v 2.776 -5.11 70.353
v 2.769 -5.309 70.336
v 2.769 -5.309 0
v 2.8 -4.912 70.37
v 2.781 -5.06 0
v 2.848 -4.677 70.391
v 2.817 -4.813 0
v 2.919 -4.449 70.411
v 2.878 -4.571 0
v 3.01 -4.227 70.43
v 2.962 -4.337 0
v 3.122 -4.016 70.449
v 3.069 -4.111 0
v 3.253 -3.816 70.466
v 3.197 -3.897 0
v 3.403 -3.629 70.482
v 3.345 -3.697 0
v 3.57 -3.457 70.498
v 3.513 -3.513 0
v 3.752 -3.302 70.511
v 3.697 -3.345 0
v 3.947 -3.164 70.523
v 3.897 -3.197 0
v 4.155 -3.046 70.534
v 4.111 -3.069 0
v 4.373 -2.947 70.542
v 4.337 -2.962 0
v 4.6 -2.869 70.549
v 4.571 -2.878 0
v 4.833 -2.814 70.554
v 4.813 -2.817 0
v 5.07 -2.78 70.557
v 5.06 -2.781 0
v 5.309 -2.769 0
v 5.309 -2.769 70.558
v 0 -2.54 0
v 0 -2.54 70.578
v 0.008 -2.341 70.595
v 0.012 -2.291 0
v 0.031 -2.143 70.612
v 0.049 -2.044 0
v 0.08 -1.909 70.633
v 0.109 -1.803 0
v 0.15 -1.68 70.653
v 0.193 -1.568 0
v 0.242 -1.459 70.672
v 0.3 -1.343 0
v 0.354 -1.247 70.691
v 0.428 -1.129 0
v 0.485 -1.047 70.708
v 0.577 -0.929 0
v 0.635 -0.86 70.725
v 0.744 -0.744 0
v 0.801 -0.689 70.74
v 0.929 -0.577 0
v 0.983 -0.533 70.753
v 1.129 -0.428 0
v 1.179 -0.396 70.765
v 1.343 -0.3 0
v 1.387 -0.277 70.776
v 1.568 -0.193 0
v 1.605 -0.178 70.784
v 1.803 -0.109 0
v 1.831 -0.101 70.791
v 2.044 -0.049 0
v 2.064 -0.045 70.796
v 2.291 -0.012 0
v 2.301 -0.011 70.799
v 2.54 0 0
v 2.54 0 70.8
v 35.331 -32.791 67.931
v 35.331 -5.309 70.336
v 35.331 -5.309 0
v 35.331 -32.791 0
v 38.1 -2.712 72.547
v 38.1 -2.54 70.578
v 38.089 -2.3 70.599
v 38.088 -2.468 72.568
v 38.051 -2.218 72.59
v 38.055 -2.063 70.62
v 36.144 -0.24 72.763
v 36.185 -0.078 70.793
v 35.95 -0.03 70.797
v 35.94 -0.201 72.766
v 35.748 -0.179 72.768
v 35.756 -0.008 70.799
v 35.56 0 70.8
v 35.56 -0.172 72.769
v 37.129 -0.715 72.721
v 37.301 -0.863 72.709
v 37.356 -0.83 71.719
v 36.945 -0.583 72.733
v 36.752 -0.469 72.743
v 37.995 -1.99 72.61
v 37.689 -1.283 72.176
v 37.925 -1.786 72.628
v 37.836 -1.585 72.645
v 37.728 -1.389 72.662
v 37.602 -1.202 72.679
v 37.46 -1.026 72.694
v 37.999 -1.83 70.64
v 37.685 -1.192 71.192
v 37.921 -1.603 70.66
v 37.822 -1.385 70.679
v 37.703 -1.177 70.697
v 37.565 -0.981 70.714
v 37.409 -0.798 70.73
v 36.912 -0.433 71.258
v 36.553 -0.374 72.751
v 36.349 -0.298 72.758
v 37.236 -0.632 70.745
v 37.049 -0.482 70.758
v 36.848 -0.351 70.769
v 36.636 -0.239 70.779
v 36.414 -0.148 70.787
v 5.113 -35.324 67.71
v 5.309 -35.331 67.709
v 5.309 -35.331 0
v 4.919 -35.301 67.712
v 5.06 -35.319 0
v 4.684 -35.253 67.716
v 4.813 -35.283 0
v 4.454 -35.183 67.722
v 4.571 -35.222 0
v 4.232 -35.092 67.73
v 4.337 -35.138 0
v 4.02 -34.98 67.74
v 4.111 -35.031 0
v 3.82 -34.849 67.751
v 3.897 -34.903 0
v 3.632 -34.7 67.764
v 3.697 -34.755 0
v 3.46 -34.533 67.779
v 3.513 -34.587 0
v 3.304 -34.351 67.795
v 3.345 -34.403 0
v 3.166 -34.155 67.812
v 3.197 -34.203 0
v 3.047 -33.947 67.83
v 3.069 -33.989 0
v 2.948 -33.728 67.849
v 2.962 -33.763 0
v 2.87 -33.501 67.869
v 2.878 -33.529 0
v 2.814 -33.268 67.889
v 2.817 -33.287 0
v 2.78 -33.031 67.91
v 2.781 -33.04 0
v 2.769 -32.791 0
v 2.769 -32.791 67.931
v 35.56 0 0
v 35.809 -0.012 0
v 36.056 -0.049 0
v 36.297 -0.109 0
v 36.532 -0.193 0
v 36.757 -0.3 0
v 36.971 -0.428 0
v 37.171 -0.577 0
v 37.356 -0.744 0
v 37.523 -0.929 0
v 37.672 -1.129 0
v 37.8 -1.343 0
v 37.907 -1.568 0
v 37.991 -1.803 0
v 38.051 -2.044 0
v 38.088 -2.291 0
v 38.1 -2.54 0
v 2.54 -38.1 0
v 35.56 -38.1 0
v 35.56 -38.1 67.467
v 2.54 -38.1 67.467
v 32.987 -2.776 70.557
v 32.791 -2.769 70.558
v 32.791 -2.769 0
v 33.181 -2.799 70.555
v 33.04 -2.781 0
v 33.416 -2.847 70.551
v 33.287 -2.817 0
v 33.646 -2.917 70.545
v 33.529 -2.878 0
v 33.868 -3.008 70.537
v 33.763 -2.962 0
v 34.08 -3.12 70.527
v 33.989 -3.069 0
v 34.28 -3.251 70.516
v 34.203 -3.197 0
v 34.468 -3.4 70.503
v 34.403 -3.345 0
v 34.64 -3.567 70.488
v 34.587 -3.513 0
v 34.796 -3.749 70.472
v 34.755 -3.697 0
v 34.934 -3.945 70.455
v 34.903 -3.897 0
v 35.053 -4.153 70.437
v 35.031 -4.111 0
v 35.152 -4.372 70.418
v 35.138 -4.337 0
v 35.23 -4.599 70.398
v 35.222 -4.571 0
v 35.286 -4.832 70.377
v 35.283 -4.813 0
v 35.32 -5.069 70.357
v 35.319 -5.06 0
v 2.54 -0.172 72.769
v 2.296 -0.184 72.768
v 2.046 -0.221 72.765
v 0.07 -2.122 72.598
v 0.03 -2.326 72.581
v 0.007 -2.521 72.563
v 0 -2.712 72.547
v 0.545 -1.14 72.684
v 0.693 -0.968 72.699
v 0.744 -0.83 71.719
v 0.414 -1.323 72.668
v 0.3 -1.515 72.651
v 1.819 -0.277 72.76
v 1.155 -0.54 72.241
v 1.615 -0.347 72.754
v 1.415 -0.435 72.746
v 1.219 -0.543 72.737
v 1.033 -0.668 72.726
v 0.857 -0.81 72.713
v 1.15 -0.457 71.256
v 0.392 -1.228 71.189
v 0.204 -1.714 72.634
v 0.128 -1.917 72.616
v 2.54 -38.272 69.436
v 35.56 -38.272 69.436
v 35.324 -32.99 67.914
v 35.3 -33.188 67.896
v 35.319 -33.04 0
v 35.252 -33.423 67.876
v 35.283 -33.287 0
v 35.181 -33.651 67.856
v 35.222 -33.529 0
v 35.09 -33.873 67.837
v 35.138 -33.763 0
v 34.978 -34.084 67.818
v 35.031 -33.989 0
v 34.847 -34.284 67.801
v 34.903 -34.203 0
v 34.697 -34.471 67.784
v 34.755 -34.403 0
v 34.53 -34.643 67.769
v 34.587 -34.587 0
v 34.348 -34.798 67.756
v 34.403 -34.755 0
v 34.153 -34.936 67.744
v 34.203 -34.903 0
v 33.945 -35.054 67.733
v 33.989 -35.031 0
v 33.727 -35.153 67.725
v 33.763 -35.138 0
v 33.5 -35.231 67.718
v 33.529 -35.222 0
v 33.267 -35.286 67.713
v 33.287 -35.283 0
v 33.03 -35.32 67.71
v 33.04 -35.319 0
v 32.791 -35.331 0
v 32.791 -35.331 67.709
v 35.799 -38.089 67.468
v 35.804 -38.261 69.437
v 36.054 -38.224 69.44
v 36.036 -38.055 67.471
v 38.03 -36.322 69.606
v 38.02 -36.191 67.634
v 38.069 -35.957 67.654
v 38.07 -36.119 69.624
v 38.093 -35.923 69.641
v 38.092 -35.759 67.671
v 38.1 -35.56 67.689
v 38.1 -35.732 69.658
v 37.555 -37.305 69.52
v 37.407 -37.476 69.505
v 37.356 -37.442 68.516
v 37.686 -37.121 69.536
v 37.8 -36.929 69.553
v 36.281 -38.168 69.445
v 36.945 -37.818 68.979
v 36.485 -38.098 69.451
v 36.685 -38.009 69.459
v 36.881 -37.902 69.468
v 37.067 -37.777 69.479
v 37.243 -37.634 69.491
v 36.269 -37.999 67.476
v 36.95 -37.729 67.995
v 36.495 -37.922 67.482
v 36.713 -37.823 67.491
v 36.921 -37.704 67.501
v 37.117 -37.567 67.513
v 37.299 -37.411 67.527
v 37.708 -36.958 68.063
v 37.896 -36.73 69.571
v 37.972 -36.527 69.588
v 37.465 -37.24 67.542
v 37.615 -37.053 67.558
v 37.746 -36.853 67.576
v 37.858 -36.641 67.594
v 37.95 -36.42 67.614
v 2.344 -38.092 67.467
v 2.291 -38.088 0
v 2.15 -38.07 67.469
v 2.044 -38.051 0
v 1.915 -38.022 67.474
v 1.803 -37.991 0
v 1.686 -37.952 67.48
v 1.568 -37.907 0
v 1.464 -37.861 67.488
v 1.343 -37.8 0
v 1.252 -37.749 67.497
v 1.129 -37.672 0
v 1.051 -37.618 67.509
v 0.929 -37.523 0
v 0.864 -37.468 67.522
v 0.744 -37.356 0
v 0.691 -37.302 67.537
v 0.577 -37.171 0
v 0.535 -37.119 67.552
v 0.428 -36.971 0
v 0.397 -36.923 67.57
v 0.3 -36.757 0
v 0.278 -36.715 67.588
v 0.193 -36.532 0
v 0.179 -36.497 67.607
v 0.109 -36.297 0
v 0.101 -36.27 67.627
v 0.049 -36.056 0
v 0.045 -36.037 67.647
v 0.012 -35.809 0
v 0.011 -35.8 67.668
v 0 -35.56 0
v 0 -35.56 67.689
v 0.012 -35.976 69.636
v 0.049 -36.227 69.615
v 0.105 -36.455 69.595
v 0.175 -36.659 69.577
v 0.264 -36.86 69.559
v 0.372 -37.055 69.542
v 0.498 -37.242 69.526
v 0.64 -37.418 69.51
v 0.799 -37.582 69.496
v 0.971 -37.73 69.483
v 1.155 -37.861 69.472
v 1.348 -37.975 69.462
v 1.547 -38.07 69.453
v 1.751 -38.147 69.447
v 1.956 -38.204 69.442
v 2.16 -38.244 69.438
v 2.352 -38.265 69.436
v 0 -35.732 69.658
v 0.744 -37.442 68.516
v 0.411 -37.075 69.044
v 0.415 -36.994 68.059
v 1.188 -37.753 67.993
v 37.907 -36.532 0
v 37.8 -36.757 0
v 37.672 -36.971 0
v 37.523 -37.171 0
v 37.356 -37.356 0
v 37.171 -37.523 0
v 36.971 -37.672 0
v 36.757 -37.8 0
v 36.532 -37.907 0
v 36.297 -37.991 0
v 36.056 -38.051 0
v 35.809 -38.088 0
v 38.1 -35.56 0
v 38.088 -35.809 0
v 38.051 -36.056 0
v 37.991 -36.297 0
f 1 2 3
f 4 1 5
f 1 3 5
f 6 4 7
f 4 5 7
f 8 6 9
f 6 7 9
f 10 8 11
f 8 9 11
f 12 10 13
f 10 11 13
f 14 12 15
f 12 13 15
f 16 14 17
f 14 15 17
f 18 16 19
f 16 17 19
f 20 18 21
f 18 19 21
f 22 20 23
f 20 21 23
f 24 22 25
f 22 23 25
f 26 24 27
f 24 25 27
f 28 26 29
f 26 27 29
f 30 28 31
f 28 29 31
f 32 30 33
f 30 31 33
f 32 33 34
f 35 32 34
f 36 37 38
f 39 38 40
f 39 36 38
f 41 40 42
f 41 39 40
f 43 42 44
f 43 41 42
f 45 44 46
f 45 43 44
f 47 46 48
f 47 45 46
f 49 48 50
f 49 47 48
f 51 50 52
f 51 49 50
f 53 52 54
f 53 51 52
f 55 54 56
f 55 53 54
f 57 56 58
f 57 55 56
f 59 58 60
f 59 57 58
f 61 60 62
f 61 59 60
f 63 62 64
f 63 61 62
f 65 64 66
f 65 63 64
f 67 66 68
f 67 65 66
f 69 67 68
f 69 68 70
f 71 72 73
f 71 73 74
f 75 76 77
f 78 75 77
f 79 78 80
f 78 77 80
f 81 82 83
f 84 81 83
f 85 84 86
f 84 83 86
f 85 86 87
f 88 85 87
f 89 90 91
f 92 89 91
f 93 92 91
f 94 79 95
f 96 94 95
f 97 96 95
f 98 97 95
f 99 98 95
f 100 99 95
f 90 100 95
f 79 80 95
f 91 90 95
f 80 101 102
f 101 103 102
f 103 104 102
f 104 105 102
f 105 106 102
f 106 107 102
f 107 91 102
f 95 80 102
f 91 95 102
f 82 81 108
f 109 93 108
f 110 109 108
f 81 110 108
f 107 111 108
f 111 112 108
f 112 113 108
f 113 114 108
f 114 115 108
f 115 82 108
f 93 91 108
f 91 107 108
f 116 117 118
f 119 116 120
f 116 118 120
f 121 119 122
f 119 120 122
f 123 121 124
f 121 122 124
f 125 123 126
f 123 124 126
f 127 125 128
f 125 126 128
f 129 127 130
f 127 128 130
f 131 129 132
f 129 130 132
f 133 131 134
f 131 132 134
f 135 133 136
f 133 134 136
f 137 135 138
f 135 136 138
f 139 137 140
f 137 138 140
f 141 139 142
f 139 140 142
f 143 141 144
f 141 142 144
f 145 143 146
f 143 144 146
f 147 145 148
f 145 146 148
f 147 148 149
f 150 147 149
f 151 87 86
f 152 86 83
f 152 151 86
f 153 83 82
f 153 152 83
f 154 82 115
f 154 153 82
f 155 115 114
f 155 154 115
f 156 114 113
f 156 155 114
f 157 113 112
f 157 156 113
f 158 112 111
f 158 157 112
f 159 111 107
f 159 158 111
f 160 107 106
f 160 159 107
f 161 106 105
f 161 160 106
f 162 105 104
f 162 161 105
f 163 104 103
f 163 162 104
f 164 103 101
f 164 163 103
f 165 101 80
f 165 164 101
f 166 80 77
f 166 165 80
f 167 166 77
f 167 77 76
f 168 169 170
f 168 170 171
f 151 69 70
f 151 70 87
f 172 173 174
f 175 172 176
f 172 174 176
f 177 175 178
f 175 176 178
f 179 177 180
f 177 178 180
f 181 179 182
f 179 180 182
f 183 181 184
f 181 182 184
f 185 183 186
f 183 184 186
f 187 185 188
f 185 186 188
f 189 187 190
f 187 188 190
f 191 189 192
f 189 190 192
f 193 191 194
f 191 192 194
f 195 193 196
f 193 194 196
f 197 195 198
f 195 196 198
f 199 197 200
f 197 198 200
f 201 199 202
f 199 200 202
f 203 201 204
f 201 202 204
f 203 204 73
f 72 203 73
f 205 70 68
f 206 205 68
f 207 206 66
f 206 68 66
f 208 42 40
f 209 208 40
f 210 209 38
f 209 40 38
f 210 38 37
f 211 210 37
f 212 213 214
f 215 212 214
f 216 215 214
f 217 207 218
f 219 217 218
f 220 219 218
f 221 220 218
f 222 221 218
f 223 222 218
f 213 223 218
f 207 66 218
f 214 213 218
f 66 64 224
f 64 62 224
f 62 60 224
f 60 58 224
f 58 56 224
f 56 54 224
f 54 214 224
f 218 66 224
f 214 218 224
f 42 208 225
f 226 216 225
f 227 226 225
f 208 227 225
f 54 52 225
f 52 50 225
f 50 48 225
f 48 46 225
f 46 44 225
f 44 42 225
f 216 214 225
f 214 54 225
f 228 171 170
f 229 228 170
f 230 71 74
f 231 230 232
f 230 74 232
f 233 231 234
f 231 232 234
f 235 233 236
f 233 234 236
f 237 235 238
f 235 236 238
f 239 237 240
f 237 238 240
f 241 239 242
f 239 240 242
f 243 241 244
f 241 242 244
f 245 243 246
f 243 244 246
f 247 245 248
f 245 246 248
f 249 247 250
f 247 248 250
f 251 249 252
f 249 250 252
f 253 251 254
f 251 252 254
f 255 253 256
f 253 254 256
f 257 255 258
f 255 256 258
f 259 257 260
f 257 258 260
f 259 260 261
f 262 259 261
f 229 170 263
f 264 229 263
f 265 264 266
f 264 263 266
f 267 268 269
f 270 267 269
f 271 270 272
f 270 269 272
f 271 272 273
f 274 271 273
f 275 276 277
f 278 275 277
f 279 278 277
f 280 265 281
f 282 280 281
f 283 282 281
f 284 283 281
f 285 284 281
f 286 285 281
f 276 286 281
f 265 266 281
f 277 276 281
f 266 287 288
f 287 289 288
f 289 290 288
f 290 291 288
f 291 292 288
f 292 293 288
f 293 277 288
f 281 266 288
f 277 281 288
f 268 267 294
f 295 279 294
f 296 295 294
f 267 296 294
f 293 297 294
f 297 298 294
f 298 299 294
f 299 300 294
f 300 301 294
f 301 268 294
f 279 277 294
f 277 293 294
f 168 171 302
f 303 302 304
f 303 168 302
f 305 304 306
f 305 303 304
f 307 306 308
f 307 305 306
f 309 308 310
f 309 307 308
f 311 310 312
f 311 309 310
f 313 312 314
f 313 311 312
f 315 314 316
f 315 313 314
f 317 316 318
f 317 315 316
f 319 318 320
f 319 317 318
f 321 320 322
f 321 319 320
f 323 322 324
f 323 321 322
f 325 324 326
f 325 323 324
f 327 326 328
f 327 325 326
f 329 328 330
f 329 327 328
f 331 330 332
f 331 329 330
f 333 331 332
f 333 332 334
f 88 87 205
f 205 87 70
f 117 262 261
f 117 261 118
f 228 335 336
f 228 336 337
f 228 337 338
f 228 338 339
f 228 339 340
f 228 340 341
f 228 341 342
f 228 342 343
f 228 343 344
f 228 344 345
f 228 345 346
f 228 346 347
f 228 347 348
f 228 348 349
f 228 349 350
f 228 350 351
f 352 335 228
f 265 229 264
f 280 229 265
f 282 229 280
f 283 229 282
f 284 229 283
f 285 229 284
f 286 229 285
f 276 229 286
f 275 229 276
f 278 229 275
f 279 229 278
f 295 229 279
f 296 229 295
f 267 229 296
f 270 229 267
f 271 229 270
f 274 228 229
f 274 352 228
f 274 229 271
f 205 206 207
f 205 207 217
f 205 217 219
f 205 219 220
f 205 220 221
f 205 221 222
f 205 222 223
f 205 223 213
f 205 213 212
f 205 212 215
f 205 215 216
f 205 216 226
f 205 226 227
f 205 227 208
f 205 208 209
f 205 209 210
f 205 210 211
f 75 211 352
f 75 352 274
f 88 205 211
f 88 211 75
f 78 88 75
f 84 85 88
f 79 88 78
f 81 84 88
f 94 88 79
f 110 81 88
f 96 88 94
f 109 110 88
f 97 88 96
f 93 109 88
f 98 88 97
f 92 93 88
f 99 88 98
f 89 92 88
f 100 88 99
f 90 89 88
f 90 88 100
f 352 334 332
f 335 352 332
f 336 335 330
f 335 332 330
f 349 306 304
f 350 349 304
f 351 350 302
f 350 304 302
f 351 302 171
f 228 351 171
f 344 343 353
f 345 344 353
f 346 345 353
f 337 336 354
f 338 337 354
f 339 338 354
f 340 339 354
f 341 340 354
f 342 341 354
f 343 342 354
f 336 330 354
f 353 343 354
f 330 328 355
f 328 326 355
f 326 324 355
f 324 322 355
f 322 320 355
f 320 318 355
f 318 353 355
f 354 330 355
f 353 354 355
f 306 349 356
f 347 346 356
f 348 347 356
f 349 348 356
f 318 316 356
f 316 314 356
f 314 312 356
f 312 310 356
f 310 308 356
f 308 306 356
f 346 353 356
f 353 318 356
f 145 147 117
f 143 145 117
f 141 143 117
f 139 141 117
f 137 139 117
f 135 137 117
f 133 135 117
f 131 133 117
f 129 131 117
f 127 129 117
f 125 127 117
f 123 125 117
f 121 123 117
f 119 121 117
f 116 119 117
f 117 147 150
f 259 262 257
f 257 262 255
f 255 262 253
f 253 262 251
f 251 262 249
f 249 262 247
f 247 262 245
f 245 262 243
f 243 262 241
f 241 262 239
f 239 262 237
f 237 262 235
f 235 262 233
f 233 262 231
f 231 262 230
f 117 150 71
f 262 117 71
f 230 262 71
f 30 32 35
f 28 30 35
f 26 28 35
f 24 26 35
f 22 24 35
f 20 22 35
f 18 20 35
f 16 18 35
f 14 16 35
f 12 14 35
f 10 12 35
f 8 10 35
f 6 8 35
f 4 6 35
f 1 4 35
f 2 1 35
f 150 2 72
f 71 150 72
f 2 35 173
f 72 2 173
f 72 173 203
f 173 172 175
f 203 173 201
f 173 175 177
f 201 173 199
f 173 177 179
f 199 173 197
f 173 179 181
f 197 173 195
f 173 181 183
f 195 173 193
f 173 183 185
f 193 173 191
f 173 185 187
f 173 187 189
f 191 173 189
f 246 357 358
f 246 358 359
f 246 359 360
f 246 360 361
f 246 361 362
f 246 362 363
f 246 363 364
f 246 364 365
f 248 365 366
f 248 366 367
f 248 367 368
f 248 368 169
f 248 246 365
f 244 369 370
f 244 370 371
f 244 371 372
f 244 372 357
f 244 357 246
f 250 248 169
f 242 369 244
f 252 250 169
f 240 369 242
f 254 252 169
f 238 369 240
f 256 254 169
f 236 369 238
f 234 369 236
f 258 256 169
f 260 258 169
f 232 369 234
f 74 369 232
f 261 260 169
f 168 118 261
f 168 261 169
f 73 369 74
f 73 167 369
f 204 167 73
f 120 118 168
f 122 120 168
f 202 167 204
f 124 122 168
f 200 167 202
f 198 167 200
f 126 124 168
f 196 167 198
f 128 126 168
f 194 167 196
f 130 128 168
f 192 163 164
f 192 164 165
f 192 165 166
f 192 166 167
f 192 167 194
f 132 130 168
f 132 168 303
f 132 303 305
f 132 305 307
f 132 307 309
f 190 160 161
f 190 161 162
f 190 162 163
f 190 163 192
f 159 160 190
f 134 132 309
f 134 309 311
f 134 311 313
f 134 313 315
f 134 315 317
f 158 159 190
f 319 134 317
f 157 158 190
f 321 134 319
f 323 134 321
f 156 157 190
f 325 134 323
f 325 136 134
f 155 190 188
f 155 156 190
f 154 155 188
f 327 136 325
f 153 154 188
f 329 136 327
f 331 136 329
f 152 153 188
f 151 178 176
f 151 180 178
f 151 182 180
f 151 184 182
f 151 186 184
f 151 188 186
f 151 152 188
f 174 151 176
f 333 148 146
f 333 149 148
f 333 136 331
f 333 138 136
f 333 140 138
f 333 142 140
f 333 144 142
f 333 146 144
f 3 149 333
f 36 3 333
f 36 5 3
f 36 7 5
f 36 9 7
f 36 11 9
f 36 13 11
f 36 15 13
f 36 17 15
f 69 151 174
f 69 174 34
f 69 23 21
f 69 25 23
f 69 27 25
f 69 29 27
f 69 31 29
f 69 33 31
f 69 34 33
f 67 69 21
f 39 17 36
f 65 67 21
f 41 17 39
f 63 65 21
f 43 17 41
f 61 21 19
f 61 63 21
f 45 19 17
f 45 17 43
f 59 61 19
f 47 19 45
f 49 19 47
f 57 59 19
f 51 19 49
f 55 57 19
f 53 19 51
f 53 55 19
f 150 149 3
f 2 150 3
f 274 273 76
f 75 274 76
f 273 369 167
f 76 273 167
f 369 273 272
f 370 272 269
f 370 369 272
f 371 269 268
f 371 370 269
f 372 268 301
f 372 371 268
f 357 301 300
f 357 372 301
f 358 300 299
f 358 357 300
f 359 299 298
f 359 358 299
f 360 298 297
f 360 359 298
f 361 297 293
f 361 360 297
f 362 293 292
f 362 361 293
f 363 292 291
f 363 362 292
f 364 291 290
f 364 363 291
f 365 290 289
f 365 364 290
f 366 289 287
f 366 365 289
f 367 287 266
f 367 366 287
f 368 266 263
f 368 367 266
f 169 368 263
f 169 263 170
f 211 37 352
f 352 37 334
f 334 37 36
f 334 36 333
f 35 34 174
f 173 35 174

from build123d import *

# Parameters (mm, degrees)
BOSS_EXTRUDE1_DEPTH = 70.8
CUT_EXTRUDE1_DEPTH  = 89.971118909
BOSS_EXTRUDE2_DEPTH = 1.976458037


with BuildPart() as part:
    # Sketch1 → Boss-Extrude1 (new body)
    with BuildSketch(Plane.XY):
        with BuildLine():
            Line((2.54, 0), (35.56, 0))
            ThreePointArc((35.56, 0), (37.356051224, -0.743948776), (38.1, -2.54))
            Line((38.1, -2.54), (38.1, -35.56))
            ThreePointArc((38.1, -35.56), (37.356051224, -37.356051224), (35.56, -38.1))
            Line((35.56, -38.1), (2.54, -38.1))
            ThreePointArc((2.54, -38.1), (0.743948776, -37.356051224), (0, -35.56))
            Line((0, -35.56), (0, -2.54))
            ThreePointArc((0, -2.54), (0.743948776, -0.743948776), (2.54, 0))
        make_face()
        with BuildLine():
            Line((5.3086, -2.7686), (32.7914, -2.7686))
            ThreePointArc((32.7914, -2.7686), (34.587451224, -3.512548776), (35.3314, -5.3086))
            Line((35.3314, -5.3086), (35.3314, -32.7914))
            ThreePointArc((35.3314, -32.7914), (34.587451224, -34.587451224), (32.7914, -35.3314))
            Line((32.7914, -35.3314), (5.3086, -35.3314))
            ThreePointArc((5.3086, -35.3314), (3.512548776, -34.587451224), (2.7686, -32.7914))
            Line((2.7686, -32.7914), (2.7686, -5.3086))
            ThreePointArc((2.7686, -5.3086), (3.512548776, -3.512548776), (5.3086, -2.7686))
        make_face(mode=Mode.SUBTRACT)
    extrude(amount=BOSS_EXTRUDE1_DEPTH)

    # Sketch2 → Cut-Extrude1 (cut, through all)
    with BuildSketch(Plane(origin=(38.1, 0, 0), x_dir=(0, 0, -1), z_dir=(1, 0, 0))):
        Polygon((-70.8, 0), (-67.46668192, -38.1), (-70.8, -38.1), align=None)
    extrude(amount=-CUT_EXTRUDE1_DEPTH, mode=Mode.SUBTRACT)

    # Sketch3 → Boss-Extrude2 (add)
    with BuildSketch(Plane(origin=(0, -6.147145489, 70.262194457), x_dir=(1, 0, 0), z_dir=(0, -0.08715574274765149, 0.9961946980917462))):
        with BuildLine():
            Line((2.54, -32.074909224), (35.56, -32.074909224))
            add(Edge.make_bspline(
                [(35.56, -32.074909224), (38.1, -32.074909224), (38.1, -29.525206837)],
                knots=[0, 0, 0, 1.570796327, 1.570796327, 1.570796327], degree=2, weights=[1, 0.707106781, 1]))
            Line((38.1, -29.525206837), (38.1, 3.620924199))
            add(Edge.make_bspline(
                [(38.1, 3.620924199), (38.1, 6.170626587), (35.56, 6.170626587)],
                knots=[1.570796327, 1.570796327, 1.570796327, 3.141592654, 3.141592654, 3.141592654], degree=2, weights=[1, 0.707106781, 1]))
            Line((35.56, 6.170626587), (2.54, 6.170626587))
            add(Edge.make_bspline(
                [(2.54, 6.170626587), (0, 6.170626587), (0, 3.620924199)],
                knots=[3.141592654, 3.141592654, 3.141592654, 4.71238898, 4.71238898, 4.71238898], degree=2, weights=[1, 0.707106781, 1]))
            Line((0, 3.620924199), (0, -29.525206837))
            add(Edge.make_bspline(
                [(0, -29.525206837), (0, -32.074909224), (2.54, -32.074909224)],
                knots=[4.71238898, 4.71238898, 4.71238898, 6.283185307, 6.283185307, 6.283185307], degree=2, weights=[1, 0.707106781, 1]))
        make_face()
    extrude(amount=BOSS_EXTRUDE2_DEPTH)


solid = part.part
